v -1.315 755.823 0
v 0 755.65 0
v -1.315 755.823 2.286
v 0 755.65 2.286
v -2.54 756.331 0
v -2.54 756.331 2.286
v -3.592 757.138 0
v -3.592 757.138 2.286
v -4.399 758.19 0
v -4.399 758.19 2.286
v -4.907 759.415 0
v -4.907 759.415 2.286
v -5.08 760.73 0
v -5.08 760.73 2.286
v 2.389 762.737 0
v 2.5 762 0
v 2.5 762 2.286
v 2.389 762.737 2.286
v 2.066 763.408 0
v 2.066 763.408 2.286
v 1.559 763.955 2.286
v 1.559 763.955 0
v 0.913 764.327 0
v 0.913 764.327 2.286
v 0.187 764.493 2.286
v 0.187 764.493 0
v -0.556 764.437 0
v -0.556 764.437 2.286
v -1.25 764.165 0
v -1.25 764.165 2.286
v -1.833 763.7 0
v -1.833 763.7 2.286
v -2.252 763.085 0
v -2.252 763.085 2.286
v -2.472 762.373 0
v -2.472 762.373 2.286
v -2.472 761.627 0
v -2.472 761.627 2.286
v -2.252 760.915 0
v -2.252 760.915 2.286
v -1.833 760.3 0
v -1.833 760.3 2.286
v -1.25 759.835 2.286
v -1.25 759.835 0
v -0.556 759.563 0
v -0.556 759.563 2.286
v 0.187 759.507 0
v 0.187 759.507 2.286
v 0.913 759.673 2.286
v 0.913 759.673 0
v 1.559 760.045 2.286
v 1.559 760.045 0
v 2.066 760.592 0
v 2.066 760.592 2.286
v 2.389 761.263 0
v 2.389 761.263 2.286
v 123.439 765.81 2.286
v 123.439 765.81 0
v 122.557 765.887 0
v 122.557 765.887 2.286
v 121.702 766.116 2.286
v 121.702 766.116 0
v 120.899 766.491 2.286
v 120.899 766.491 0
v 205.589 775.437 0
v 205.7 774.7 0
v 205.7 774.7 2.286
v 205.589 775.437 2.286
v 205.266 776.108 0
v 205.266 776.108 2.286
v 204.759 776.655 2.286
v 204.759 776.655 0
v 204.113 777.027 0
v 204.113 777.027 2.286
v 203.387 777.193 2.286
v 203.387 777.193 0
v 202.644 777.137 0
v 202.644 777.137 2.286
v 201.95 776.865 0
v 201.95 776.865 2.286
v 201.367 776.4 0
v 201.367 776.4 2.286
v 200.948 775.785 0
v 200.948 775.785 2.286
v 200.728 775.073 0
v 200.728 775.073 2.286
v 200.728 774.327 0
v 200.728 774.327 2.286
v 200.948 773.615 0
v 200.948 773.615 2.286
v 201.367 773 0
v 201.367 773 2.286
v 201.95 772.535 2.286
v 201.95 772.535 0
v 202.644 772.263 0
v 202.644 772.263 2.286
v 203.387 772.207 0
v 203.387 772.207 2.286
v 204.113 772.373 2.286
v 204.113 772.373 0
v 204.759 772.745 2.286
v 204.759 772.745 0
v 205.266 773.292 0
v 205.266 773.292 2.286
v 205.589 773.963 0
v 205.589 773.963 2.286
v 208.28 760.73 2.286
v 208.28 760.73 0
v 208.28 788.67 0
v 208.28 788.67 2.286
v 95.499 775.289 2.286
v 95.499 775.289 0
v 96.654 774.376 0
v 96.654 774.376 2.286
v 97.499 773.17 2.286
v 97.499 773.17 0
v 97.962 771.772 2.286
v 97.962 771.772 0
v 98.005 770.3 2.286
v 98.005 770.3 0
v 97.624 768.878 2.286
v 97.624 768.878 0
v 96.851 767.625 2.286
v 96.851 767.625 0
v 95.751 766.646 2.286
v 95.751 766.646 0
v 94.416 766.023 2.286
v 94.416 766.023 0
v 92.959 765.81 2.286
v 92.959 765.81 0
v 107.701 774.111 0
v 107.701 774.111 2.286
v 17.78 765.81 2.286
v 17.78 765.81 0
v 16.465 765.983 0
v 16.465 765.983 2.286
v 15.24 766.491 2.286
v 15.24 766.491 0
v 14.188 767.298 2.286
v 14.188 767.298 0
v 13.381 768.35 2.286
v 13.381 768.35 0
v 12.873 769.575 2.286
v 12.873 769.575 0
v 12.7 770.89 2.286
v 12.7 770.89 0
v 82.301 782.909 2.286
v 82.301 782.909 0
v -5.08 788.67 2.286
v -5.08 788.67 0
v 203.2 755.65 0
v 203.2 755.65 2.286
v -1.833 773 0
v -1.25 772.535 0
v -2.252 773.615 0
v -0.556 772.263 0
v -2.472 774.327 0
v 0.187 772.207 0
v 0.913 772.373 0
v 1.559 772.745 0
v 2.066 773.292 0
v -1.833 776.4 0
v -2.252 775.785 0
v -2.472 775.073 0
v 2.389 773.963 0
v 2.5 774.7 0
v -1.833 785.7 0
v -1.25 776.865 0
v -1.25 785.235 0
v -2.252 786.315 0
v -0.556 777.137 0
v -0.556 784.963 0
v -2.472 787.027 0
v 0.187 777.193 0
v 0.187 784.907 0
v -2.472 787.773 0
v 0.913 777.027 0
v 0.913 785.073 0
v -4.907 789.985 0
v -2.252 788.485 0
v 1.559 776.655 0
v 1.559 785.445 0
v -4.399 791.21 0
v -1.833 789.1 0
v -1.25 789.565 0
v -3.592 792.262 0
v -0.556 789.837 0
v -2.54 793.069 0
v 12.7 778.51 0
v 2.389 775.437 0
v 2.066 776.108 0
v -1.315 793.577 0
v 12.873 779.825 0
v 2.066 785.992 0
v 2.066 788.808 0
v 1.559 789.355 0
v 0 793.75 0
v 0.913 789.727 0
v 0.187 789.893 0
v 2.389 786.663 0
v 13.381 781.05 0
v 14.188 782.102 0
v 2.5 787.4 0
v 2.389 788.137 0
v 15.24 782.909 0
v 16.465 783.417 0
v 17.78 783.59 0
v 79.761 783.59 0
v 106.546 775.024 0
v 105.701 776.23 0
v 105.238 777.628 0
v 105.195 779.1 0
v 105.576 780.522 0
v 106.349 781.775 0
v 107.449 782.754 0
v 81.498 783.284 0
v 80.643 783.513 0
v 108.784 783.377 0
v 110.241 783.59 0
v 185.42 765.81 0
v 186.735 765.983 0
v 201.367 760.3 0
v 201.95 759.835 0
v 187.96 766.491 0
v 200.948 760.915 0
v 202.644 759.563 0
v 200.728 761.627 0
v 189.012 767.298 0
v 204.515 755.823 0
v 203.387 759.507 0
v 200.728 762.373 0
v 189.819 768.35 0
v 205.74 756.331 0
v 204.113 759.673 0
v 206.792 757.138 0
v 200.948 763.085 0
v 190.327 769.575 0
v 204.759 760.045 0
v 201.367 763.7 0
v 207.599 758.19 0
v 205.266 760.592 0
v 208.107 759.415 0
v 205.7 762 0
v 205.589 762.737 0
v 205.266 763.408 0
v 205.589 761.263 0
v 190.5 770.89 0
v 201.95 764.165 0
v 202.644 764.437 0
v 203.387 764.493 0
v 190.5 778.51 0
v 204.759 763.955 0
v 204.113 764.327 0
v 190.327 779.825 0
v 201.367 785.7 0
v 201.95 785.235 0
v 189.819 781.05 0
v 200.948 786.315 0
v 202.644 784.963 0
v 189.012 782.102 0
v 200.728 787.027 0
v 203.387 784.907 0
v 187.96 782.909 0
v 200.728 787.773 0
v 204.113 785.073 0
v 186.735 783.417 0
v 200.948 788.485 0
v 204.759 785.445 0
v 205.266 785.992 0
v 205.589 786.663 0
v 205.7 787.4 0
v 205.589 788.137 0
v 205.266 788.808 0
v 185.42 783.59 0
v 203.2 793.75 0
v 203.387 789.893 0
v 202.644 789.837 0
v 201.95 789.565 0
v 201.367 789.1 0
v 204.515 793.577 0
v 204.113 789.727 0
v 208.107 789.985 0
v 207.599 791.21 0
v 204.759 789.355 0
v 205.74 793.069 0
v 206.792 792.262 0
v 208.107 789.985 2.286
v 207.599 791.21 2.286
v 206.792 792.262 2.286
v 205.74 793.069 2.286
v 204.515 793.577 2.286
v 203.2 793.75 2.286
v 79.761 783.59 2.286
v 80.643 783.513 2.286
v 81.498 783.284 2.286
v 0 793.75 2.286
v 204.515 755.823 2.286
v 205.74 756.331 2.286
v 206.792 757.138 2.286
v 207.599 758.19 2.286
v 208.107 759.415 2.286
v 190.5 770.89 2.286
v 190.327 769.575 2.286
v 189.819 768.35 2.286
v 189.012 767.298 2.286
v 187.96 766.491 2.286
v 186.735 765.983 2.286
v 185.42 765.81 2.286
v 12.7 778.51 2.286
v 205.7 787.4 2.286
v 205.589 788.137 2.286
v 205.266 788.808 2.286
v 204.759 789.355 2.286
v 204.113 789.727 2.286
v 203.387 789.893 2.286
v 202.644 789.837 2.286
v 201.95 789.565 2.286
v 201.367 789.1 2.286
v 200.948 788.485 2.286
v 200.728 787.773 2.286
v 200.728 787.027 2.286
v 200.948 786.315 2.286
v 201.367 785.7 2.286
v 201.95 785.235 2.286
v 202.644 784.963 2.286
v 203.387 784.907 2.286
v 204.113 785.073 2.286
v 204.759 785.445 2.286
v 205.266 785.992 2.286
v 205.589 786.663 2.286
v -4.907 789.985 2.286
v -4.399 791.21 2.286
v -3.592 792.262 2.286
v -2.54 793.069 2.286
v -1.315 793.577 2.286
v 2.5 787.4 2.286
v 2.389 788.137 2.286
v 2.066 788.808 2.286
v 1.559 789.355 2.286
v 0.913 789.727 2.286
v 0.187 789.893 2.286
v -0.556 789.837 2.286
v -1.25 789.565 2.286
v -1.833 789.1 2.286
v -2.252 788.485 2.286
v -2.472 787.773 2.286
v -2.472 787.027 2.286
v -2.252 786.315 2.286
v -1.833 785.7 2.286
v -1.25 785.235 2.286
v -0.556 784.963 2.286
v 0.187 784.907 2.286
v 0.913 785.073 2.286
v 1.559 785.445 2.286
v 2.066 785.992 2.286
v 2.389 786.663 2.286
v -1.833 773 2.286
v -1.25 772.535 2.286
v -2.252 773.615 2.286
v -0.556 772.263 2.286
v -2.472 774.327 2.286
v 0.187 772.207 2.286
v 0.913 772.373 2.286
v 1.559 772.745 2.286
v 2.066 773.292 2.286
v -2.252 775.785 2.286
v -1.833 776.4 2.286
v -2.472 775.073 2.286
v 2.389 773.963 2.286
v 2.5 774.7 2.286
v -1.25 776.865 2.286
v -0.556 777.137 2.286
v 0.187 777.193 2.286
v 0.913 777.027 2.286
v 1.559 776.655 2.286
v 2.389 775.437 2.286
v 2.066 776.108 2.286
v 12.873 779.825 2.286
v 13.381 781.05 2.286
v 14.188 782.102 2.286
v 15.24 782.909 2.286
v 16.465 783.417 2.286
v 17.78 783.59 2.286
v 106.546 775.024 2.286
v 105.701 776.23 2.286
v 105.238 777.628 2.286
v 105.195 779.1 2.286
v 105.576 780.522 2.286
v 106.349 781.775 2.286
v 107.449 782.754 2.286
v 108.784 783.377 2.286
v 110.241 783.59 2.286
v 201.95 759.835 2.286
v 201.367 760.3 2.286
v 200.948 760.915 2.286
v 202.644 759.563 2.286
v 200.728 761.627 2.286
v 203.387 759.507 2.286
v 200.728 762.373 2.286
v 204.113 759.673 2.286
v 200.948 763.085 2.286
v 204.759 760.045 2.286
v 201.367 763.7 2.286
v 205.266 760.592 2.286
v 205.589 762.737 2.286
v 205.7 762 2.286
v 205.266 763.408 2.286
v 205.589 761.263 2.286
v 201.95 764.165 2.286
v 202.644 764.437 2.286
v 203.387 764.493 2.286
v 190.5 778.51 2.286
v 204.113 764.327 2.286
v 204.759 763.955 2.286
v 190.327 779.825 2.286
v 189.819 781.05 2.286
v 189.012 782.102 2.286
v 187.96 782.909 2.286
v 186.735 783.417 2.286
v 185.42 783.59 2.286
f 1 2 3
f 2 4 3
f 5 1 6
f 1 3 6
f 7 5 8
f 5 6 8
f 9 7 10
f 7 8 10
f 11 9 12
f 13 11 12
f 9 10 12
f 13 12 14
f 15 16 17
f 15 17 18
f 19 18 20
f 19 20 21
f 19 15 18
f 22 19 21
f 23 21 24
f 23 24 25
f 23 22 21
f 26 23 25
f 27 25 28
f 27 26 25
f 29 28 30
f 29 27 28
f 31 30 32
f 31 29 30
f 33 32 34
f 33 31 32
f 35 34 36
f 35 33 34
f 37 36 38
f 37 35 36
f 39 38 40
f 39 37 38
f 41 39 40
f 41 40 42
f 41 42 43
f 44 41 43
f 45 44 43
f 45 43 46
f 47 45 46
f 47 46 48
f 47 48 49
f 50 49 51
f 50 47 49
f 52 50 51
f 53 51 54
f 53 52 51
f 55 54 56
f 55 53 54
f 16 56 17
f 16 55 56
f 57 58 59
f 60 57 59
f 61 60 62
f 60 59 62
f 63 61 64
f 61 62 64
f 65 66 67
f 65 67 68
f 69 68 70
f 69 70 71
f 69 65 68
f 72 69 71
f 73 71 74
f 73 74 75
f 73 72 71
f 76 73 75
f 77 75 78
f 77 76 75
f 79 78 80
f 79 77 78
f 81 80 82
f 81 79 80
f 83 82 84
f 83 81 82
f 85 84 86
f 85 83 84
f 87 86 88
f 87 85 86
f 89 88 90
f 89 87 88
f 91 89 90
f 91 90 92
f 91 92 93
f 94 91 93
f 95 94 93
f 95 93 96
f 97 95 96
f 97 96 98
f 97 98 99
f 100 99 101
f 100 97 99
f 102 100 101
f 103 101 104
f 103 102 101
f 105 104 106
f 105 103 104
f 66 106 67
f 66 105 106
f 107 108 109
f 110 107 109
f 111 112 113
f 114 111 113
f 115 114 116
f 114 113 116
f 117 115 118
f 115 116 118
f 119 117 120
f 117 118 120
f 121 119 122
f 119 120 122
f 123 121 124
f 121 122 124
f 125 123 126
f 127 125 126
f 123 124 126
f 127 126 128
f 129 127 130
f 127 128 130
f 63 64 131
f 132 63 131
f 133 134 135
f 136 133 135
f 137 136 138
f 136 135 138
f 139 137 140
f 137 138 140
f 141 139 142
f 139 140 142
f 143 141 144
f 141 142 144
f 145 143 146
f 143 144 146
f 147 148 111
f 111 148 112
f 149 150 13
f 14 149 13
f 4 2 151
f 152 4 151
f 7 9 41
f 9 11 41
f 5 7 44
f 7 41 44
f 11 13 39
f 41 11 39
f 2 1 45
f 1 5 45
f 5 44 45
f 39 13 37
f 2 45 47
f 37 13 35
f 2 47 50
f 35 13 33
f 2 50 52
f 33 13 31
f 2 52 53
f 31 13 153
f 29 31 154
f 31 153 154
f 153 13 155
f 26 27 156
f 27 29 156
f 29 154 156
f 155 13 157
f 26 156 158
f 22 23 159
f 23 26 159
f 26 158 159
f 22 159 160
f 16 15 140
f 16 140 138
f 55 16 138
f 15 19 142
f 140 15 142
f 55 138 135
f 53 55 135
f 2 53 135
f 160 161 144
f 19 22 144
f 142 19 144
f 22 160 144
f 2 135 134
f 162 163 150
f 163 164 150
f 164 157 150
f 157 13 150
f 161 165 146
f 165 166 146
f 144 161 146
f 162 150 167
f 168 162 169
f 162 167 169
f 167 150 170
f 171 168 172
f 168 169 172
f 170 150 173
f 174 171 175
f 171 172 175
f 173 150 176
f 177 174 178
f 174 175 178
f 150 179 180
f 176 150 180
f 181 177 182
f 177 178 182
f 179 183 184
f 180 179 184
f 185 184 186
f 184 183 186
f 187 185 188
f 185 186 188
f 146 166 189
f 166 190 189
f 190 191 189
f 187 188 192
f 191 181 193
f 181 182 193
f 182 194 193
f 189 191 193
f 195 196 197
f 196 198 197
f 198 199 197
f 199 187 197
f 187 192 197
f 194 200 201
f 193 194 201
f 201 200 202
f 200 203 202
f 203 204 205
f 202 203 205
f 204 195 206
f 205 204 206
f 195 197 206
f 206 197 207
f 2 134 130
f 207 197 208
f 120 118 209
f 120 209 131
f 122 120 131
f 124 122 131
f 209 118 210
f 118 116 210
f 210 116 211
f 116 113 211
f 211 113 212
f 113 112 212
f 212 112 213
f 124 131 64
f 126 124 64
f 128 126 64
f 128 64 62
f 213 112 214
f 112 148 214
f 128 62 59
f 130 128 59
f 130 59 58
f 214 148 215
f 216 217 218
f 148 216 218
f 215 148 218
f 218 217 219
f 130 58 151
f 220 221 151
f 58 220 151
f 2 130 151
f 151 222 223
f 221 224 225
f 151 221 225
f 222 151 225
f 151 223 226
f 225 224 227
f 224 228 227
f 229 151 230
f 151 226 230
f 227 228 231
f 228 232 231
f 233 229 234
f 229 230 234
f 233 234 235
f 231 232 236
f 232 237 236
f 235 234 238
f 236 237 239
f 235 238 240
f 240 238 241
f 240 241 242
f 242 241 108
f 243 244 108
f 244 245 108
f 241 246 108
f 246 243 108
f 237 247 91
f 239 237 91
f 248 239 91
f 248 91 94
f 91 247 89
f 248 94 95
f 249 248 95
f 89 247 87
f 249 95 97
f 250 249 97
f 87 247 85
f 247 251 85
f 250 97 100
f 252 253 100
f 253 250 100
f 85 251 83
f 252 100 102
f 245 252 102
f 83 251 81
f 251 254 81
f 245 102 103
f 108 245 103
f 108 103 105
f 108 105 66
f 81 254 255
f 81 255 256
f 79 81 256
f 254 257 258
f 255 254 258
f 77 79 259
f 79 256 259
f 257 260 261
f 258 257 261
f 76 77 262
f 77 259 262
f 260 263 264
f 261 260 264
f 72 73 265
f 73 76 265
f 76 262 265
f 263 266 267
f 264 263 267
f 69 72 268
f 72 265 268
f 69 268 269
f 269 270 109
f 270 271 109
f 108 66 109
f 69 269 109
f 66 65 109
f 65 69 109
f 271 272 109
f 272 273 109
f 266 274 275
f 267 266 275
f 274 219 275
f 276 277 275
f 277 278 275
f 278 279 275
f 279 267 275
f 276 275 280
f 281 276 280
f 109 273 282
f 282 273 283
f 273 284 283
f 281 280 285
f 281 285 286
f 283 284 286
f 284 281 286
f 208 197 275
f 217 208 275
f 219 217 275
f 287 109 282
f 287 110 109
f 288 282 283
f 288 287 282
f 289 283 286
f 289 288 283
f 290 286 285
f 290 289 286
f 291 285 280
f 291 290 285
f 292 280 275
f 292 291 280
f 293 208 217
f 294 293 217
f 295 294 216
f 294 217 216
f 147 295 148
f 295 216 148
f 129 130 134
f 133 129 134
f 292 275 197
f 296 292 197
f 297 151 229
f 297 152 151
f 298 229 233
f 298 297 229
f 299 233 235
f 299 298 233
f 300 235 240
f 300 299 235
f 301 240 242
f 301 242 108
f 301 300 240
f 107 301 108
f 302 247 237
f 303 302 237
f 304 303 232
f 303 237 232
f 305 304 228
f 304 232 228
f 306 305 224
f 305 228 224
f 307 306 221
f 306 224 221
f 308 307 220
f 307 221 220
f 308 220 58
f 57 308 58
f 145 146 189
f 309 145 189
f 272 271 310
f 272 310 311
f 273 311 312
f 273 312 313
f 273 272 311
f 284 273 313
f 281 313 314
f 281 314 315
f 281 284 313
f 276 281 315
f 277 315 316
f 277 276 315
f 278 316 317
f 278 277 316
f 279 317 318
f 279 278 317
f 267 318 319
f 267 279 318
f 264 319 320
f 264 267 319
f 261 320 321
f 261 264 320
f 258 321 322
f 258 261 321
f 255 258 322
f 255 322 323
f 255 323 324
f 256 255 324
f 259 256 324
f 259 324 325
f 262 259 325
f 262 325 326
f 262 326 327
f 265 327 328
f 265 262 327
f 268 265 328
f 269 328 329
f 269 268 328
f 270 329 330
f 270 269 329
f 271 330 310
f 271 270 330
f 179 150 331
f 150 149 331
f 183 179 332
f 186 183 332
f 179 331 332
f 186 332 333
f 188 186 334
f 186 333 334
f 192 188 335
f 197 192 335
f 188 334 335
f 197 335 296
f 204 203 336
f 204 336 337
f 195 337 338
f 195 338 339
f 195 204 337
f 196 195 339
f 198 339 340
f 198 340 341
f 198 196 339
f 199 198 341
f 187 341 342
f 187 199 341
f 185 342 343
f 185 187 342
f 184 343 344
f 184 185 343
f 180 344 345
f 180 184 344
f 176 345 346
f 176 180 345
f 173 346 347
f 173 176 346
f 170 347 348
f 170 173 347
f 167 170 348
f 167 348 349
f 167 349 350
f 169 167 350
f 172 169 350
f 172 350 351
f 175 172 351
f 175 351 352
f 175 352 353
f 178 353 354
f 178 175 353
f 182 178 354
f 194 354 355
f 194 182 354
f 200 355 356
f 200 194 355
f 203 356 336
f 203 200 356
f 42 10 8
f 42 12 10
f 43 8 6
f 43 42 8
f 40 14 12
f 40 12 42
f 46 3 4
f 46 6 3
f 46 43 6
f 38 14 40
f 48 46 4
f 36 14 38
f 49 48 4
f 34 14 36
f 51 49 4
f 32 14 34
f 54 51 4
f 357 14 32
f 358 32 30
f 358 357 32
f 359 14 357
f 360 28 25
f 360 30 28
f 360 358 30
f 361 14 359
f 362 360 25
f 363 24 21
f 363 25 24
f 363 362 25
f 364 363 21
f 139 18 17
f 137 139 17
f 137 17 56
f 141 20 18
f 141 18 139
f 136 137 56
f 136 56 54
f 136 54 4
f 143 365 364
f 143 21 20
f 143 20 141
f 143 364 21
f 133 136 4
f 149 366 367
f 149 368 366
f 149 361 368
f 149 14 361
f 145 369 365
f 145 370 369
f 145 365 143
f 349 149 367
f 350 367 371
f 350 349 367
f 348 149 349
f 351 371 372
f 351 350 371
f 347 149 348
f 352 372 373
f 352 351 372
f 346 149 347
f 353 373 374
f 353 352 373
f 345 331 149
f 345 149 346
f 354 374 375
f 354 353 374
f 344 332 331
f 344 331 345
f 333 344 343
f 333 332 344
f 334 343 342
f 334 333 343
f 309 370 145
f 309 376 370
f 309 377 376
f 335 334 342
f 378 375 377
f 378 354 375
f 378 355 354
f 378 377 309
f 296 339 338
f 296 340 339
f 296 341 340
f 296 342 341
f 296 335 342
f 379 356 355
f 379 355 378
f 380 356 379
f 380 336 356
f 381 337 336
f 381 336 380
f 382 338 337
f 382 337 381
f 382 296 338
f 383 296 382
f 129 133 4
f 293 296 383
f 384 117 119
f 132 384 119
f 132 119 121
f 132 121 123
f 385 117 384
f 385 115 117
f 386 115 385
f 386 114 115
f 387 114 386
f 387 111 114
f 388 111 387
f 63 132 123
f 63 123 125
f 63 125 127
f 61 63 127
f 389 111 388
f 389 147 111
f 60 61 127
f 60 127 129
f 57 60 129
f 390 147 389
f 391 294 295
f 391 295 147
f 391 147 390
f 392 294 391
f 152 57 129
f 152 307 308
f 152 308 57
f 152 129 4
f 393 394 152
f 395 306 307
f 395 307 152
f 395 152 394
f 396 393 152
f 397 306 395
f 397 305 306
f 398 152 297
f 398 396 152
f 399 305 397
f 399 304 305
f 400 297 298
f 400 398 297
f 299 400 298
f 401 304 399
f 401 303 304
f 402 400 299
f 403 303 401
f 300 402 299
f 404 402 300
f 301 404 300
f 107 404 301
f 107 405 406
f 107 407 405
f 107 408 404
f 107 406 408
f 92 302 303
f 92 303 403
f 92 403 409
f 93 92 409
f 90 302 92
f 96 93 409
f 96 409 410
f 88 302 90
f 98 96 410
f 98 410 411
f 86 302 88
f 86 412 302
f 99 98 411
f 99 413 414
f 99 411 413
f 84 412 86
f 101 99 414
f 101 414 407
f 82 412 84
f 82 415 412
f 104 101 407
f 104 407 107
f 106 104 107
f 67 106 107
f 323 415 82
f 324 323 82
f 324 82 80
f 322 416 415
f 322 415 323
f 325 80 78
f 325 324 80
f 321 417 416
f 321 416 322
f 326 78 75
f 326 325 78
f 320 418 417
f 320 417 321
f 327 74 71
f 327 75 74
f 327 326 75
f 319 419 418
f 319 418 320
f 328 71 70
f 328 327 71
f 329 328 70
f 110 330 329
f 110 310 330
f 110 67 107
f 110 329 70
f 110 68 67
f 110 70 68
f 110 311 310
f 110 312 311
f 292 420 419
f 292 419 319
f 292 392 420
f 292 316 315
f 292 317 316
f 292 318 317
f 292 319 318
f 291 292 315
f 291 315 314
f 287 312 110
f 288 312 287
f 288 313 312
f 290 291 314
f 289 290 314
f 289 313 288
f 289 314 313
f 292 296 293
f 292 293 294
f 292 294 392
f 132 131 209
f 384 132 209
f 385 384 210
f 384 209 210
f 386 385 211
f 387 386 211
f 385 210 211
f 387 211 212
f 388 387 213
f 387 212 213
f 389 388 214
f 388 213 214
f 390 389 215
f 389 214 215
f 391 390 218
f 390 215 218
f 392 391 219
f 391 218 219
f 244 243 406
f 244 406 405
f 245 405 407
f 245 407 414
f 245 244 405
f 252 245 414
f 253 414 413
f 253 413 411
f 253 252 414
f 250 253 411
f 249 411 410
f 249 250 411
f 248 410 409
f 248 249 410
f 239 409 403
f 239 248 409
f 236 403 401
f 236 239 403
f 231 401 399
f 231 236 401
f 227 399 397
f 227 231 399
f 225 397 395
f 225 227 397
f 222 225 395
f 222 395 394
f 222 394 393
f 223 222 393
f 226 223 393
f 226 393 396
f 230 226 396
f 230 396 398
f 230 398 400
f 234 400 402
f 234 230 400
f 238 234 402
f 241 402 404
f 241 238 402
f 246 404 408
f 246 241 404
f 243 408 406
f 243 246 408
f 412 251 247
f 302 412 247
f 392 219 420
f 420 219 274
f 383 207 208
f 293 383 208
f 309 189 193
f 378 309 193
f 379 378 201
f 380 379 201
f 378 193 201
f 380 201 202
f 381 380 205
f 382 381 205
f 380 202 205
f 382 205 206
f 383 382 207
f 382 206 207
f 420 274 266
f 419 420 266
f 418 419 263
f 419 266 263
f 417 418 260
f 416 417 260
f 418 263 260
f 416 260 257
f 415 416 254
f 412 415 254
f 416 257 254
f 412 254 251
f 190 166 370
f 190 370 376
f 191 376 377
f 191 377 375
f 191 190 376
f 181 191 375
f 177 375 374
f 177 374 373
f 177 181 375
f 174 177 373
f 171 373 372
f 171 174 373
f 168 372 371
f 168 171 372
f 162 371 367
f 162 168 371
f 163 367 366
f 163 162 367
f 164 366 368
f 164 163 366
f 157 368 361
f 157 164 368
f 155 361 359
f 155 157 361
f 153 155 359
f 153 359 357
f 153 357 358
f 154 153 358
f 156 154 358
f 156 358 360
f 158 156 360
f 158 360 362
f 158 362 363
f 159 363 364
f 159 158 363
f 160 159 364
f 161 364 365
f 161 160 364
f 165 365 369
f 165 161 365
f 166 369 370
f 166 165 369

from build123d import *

# Parameters (mm, degrees)
SKETCH1_R           = 2.5
BOSS_EXTRUDE1_DEPTH = 2.286
CUT_EXTRUDE1_DEPTH  = 823.59169598
FILLET1_R           = 5.08


with BuildPart() as part:
    # Sketch1 → Boss-Extrude1 (new body)
    with BuildSketch(Plane.XY):
        with BuildLine():
            Line((-7.62, 755.65), (210.82, 755.65))
            ThreePointArc((210.82, 755.65), (214.412102448, 757.137897552), (215.9, 760.73))
            Line((215.9, 760.73), (215.9, 788.67))
            ThreePointArc((215.9, 788.67), (214.412102448, 792.262102448), (210.82, 793.75))
            Line((210.82, 793.75), (-7.62, 793.75))
            ThreePointArc((-7.62, 793.75), (-11.212102448, 792.262102448), (-12.7, 788.67))
            Line((-12.7, 788.67), (-12.7, 760.73))
            ThreePointArc((-12.7, 760.73), (-11.212102448, 757.137897552), (-7.62, 755.65))
        make_face()
        with Locations((0, 762)):
            Circle(SKETCH1_R, mode=Mode.SUBTRACT)
        with Locations((0, 774.7)):
            Circle(SKETCH1_R, mode=Mode.SUBTRACT)
        with Locations((0, 787.4)):
            Circle(SKETCH1_R, mode=Mode.SUBTRACT)
        with Locations((203.2, 762)):
            Circle(SKETCH1_R, mode=Mode.SUBTRACT)
        with Locations((203.2, 774.7)):
            Circle(SKETCH1_R, mode=Mode.SUBTRACT)
        with Locations((203.2, 787.4)):
            Circle(SKETCH1_R, mode=Mode.SUBTRACT)
        with BuildLine():
            Line((17.78, 783.59), (79.760886363, 783.59))
            ThreePointArc((79.760886363, 783.59), (81.075687113, 783.416903198), (82.300886363, 782.909409051))
            Line((82.300886363, 782.909409051), (95.499113517, 775.289409051))
            ThreePointArc((95.499113517, 775.289409051), (97.866016715, 769.575199251), (92.959113517, 765.81))
            Line((92.959113517, 765.81), (17.78, 765.81))
            ThreePointArc((17.78, 765.81), (14.187897552, 767.297897552), (12.7, 770.89))
            Line((12.7, 770.89), (12.7, 778.51))
            ThreePointArc((12.7, 778.51), (14.187897552, 782.102102448), (17.78, 783.59))
        make_face(mode=Mode.SUBTRACT)
        with BuildLine():
            Line((190.5, 778.51), (190.5, 770.89))
            ThreePointArc((190.5, 770.89), (189.012102448, 767.297897552), (185.42, 765.81))
            Line((185.42, 765.81), (123.439113517, 765.81))
            ThreePointArc((123.439113517, 765.81), (122.124312768, 765.983096802), (120.899113517, 766.490590949))
            Line((120.899113517, 766.490590949), (107.700886363, 774.110590949))
            ThreePointArc((107.700886363, 774.110590949), (105.333983166, 779.824800749), (110.240886363, 783.59))
            Line((110.240886363, 783.59), (185.42, 783.59))
            ThreePointArc((185.42, 783.59), (189.012102448, 782.102102448), (190.5, 778.51))
        make_face(mode=Mode.SUBTRACT)
    extrude(amount=BOSS_EXTRUDE1_DEPTH)

    # Sketch3 → Cut-Extrude1 (cut, through all)
    with BuildSketch(Plane(origin=(0, 0, 0), x_dir=(-1, 0, 0), z_dir=(0, 0, -1))):
        with BuildLine():
            Line((-210.82, 755.65), (-208.28, 755.65))
            Line((-208.28, 755.65), (-208.28, 793.75))
            Line((-208.28, 793.75), (-210.82, 793.75))
            ThreePointArc((-210.82, 793.75), (-214.412102448, 792.262102448), (-215.9, 788.67))
            Line((-215.9, 788.67), (-215.9, 760.73))
            ThreePointArc((-215.9, 760.73), (-214.412102448, 757.137897552), (-210.82, 755.65))
        make_face()
        with BuildLine():
            Line((5.08, 793.75), (5.08, 755.65))
            Line((5.08, 755.65), (7.62, 755.65))
            ThreePointArc((7.62, 755.65), (11.212102448, 757.137897552), (12.7, 760.73))
            Line((12.7, 760.73), (12.7, 788.67))
            ThreePointArc((12.7, 788.67), (11.212102448, 792.262102448), (7.62, 793.75))
            Line((7.62, 793.75), (5.08, 793.75))
        make_face()
    extrude(amount=-CUT_EXTRUDE1_DEPTH, mode=Mode.SUBTRACT)

    # Fillet1
    fillet1_edges = [part.edges().sort_by_distance(p)[0] for p in [
        (208.28, 755.65, 1.143),
        (208.28, 793.75, 1.143),
        (-5.08, 755.65, 1.143),
        (-5.08, 793.75, 1.143),
    ]]
    fillet(fillet1_edges, radius=FILLET1_R)


solid = part.part
